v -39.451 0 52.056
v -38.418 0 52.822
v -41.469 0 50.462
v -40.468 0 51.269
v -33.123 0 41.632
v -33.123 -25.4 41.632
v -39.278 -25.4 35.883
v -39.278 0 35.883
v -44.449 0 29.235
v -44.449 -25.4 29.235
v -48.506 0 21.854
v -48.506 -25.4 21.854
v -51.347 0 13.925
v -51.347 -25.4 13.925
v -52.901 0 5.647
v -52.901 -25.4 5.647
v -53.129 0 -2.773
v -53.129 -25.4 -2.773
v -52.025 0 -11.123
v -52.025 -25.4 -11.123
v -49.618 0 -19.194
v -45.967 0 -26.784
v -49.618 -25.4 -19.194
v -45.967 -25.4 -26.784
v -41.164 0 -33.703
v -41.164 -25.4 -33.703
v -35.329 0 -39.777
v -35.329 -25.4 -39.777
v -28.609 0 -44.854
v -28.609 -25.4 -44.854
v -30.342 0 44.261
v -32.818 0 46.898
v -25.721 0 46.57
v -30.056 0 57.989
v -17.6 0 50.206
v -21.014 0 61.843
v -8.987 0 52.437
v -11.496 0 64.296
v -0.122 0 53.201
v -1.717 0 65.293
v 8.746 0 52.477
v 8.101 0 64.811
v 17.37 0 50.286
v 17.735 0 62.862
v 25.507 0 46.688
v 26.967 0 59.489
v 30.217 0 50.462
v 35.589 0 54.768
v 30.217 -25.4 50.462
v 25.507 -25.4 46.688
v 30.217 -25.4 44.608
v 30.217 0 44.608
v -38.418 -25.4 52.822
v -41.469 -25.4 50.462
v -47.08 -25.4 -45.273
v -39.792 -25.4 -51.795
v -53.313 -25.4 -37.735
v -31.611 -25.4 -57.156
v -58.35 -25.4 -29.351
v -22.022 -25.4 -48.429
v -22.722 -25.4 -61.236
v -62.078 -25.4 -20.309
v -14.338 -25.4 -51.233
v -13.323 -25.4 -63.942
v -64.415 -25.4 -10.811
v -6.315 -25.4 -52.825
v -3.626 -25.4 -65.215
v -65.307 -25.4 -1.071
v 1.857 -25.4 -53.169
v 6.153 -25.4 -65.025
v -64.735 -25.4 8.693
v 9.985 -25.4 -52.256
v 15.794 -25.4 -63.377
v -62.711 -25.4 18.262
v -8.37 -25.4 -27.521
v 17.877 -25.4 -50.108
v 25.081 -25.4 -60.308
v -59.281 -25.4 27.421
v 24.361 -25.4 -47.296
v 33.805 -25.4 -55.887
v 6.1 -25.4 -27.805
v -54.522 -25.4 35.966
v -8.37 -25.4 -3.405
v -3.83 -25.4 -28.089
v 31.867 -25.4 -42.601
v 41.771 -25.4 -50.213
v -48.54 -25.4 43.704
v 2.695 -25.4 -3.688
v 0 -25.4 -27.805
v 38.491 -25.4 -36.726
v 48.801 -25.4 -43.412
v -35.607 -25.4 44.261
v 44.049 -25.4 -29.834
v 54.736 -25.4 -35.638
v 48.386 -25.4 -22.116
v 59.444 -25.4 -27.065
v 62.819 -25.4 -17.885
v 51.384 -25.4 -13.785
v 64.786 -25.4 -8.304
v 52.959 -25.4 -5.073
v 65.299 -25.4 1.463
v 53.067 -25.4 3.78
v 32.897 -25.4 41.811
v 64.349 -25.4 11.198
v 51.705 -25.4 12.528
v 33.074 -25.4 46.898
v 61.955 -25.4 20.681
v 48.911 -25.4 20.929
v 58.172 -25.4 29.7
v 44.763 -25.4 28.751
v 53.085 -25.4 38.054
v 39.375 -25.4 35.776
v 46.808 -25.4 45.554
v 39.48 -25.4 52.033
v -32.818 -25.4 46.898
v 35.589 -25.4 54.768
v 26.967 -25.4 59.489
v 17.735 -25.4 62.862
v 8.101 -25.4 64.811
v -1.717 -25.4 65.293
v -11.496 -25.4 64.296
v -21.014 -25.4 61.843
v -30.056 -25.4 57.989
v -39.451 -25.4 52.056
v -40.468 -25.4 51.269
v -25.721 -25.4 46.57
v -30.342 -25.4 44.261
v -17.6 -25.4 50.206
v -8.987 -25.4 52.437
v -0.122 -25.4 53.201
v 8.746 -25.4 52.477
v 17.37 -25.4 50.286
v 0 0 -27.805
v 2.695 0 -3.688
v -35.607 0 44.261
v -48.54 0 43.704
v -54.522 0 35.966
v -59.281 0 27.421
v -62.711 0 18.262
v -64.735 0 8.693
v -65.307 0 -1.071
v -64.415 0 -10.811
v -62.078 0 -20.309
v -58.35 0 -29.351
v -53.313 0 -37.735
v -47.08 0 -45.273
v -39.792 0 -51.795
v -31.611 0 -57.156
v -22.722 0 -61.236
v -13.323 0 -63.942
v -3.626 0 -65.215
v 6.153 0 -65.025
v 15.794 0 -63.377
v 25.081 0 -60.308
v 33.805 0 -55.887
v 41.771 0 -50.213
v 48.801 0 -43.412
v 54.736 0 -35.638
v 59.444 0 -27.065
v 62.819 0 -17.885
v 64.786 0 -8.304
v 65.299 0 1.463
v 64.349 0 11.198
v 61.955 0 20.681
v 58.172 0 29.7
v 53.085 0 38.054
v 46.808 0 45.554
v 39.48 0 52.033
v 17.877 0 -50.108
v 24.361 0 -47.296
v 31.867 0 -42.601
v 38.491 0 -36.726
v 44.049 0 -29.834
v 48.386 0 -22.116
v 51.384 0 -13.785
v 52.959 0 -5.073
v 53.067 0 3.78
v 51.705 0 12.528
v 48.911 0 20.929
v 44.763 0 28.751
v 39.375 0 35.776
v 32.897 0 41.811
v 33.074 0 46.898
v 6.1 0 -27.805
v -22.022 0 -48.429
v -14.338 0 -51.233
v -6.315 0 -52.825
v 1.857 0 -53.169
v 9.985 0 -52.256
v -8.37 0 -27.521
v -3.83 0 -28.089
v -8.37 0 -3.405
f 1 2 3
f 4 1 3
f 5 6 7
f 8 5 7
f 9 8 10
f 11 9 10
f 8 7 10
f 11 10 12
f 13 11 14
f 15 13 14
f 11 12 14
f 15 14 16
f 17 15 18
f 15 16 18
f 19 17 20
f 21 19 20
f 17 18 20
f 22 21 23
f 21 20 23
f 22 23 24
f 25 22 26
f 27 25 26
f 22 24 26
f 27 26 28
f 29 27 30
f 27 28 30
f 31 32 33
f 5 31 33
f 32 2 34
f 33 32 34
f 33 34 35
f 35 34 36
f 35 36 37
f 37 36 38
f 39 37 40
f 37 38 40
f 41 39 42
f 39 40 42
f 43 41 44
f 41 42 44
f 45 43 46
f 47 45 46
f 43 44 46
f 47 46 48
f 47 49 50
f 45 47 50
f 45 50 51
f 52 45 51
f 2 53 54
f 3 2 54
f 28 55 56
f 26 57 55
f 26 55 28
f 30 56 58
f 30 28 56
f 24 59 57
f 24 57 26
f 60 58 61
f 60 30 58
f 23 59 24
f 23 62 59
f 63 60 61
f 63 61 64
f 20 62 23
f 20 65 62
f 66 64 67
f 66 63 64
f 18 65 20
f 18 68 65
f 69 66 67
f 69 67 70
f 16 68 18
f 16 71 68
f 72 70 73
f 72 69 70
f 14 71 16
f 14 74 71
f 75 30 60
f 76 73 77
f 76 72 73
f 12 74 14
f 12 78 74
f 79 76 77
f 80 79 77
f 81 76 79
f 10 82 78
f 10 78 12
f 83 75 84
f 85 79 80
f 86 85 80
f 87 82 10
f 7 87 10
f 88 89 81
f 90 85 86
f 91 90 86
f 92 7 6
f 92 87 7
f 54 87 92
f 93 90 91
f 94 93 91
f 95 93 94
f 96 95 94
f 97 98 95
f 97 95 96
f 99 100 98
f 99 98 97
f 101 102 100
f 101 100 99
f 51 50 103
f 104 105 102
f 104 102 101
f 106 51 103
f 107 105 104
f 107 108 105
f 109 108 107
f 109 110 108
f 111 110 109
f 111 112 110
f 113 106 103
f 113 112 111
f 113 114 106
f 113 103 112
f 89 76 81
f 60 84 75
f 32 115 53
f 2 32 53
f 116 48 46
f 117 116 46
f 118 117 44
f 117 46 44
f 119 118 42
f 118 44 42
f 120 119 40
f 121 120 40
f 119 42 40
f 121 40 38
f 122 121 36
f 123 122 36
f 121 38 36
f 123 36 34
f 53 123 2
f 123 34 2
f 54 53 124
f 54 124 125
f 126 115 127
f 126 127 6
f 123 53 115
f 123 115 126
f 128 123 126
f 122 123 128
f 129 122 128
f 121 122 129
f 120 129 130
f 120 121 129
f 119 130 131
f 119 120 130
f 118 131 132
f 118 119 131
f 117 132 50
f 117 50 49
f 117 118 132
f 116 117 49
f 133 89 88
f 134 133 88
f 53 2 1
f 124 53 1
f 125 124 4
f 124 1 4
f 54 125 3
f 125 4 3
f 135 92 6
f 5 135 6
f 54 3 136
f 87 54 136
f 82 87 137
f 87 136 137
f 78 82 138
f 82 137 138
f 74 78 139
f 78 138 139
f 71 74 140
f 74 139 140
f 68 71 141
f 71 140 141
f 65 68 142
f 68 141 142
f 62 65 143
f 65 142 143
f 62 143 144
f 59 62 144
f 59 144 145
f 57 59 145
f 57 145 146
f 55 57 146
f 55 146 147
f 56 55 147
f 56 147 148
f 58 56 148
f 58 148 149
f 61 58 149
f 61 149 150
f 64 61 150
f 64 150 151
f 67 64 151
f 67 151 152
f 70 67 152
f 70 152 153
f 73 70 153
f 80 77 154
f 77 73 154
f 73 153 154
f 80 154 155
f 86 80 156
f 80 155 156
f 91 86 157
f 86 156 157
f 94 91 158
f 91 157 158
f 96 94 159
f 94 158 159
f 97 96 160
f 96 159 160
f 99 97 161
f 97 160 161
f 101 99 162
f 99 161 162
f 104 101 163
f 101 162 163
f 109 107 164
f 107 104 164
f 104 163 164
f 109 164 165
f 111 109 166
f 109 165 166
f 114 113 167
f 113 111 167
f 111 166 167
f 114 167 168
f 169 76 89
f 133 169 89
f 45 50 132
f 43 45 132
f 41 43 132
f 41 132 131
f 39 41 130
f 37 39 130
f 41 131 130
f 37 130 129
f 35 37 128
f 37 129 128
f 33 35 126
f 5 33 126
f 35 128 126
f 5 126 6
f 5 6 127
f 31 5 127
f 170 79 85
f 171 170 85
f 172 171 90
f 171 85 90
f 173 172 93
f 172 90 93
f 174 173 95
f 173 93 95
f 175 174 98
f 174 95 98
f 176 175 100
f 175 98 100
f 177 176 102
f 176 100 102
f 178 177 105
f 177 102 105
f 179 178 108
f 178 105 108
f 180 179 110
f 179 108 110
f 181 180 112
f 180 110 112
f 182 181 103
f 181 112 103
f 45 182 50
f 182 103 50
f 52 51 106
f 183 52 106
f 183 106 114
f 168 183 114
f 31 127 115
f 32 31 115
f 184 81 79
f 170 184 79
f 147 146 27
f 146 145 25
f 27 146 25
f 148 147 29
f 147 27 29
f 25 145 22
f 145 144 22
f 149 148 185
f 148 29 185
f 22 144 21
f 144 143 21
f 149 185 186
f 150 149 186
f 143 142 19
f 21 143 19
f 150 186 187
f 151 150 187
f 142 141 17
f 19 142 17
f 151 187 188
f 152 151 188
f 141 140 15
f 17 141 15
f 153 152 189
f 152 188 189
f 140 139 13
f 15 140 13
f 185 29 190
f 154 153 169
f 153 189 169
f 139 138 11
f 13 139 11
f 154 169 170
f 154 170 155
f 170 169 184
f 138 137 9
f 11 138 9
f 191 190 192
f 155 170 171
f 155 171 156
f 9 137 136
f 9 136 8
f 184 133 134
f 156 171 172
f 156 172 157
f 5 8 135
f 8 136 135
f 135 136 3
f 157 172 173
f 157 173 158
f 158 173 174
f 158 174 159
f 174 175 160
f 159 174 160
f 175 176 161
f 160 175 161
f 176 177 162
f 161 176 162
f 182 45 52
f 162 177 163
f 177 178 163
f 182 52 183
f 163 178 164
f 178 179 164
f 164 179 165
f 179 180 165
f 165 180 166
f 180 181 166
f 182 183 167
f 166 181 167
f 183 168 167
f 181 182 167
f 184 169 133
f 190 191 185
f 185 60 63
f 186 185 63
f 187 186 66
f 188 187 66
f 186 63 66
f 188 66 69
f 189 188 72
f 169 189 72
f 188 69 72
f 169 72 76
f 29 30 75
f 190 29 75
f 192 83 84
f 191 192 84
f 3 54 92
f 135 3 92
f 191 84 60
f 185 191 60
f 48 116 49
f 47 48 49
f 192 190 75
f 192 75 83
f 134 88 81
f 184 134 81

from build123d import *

# Parameters (mm, degrees)
F0_R     = 65.3157264909
F1_DEPTH = 25.4
F3_DEPTH = 25.4
F5_DEPTH = 25.4
F7_DEPTH = 25.4
F9_DEPTH = 25.4


with BuildPart() as f1:
    # F0 (on Front) → F1 (new body)
    with BuildSketch(Plane.XZ):
        Circle(F0_R)
    extrude(amount=F1_DEPTH)

    # F2 (on face) → F3 (cut)
    with BuildSketch(Plane.XZ.offset(25.4)):
        Polygon((-38.4182271411, 52.8221918361), (-41.4694152245, 50.4621811654), (-35.6072857976, 44.2608520389), (-32.8178254442, 46.8977347602), align=None)
        with BuildLine():
            ThreePointArc((39.4804287796, 52.0330651645), (37.5595862958, 53.436145111), (35.5889278088, 54.7683516682))
            Line((35.5889278088, 54.7683516682), (30.2165448666, 50.4621811654))
            Line((30.2165448666, 50.4621811654), (33.0735850542, 46.8977347602))
            Line((33.0735850542, 46.8977347602), (39.4804287796, 52.0330651645))
        make_face()
    extrude(amount=-F3_DEPTH, mode=Mode.SUBTRACT)

    # F4 (on face) → F5 (cut)
    with BuildSketch(Plane.XZ.offset(25.4)):
        with BuildLine():
            ThreePointArc((24.3610851999, -47.2958902978), (45.4224711355, -27.6977043655), (53.2011626863, 0))
            ThreePointArc((53.2011626863, 0), (-25.5768796637, 46.6496188392), (-28.6085883777, -44.8543463023))
            Line((-28.6085883777, -44.8543463023), (-8.3698397502, -27.5211706758))
            Line((-8.3698397502, -27.5211706758), (-8.3698397502, -3.4046808723))
            Line((-8.3698397502, -3.4046808723), (-3.8302657194, -28.0886162072))
            Line((-3.8302657194, -28.0886162072), (-22.0219158301, -48.429318954))
            ThreePointArc((-22.0219158301, -48.429318954), (-2.2358787042, -53.1541584224), (17.8770535247, -50.1076308405))
            Line((17.8770535247, -50.1076308405), (0, -27.8048943728))
            Line((0, -27.8048943728), (2.6953709312, -3.6884043366))
            Line((2.6953709312, -3.6884043366), (6.1000534333, -27.8048943728))
            Line((6.1000534333, -27.8048943728), (24.3610851999, -47.2958902978))
        make_face()
    extrude(amount=-F5_DEPTH, mode=Mode.SUBTRACT)

    # F6 (on face) → F7 (cut)
    with BuildSketch(Plane.XZ.offset(25.4)):
        Polygon((-32.8178254442, 46.8977347602), (-35.6072857976, 44.2608520389), (-33.1226048826, 41.6324003268), (-30.3420633808, 44.2608520389), align=None)
        Polygon((30.2165448666, 50.4621811654), (25.5074180222, 46.6876358045), (33.0735850542, 46.8977347602), align=None)
        Polygon((33.0735850542, 46.8977347602), (25.5074180222, 46.6876358045), (30.2165448666, 44.607707725), align=None)
    extrude(amount=-F7_DEPTH, mode=Mode.SUBTRACT)

    # F8 (on face) → F9 (cut)
    with BuildSketch(Plane.XZ.offset(25.4)):
        with BuildLine():
            Line((28.7985692311, 41.3972952134), (29.9383787891, 43.977917034))
            ThreePointArc((29.9383787891, 43.977917034), (27.7559856601, 45.3868810474), (25.5074180222, 46.6876358045))
            Line((25.5074180222, 46.6876358045), (28.7985692311, 41.3972952134))
        make_face()
    extrude(amount=-F9_DEPTH, mode=Mode.SUBTRACT)


solid = f1.part
